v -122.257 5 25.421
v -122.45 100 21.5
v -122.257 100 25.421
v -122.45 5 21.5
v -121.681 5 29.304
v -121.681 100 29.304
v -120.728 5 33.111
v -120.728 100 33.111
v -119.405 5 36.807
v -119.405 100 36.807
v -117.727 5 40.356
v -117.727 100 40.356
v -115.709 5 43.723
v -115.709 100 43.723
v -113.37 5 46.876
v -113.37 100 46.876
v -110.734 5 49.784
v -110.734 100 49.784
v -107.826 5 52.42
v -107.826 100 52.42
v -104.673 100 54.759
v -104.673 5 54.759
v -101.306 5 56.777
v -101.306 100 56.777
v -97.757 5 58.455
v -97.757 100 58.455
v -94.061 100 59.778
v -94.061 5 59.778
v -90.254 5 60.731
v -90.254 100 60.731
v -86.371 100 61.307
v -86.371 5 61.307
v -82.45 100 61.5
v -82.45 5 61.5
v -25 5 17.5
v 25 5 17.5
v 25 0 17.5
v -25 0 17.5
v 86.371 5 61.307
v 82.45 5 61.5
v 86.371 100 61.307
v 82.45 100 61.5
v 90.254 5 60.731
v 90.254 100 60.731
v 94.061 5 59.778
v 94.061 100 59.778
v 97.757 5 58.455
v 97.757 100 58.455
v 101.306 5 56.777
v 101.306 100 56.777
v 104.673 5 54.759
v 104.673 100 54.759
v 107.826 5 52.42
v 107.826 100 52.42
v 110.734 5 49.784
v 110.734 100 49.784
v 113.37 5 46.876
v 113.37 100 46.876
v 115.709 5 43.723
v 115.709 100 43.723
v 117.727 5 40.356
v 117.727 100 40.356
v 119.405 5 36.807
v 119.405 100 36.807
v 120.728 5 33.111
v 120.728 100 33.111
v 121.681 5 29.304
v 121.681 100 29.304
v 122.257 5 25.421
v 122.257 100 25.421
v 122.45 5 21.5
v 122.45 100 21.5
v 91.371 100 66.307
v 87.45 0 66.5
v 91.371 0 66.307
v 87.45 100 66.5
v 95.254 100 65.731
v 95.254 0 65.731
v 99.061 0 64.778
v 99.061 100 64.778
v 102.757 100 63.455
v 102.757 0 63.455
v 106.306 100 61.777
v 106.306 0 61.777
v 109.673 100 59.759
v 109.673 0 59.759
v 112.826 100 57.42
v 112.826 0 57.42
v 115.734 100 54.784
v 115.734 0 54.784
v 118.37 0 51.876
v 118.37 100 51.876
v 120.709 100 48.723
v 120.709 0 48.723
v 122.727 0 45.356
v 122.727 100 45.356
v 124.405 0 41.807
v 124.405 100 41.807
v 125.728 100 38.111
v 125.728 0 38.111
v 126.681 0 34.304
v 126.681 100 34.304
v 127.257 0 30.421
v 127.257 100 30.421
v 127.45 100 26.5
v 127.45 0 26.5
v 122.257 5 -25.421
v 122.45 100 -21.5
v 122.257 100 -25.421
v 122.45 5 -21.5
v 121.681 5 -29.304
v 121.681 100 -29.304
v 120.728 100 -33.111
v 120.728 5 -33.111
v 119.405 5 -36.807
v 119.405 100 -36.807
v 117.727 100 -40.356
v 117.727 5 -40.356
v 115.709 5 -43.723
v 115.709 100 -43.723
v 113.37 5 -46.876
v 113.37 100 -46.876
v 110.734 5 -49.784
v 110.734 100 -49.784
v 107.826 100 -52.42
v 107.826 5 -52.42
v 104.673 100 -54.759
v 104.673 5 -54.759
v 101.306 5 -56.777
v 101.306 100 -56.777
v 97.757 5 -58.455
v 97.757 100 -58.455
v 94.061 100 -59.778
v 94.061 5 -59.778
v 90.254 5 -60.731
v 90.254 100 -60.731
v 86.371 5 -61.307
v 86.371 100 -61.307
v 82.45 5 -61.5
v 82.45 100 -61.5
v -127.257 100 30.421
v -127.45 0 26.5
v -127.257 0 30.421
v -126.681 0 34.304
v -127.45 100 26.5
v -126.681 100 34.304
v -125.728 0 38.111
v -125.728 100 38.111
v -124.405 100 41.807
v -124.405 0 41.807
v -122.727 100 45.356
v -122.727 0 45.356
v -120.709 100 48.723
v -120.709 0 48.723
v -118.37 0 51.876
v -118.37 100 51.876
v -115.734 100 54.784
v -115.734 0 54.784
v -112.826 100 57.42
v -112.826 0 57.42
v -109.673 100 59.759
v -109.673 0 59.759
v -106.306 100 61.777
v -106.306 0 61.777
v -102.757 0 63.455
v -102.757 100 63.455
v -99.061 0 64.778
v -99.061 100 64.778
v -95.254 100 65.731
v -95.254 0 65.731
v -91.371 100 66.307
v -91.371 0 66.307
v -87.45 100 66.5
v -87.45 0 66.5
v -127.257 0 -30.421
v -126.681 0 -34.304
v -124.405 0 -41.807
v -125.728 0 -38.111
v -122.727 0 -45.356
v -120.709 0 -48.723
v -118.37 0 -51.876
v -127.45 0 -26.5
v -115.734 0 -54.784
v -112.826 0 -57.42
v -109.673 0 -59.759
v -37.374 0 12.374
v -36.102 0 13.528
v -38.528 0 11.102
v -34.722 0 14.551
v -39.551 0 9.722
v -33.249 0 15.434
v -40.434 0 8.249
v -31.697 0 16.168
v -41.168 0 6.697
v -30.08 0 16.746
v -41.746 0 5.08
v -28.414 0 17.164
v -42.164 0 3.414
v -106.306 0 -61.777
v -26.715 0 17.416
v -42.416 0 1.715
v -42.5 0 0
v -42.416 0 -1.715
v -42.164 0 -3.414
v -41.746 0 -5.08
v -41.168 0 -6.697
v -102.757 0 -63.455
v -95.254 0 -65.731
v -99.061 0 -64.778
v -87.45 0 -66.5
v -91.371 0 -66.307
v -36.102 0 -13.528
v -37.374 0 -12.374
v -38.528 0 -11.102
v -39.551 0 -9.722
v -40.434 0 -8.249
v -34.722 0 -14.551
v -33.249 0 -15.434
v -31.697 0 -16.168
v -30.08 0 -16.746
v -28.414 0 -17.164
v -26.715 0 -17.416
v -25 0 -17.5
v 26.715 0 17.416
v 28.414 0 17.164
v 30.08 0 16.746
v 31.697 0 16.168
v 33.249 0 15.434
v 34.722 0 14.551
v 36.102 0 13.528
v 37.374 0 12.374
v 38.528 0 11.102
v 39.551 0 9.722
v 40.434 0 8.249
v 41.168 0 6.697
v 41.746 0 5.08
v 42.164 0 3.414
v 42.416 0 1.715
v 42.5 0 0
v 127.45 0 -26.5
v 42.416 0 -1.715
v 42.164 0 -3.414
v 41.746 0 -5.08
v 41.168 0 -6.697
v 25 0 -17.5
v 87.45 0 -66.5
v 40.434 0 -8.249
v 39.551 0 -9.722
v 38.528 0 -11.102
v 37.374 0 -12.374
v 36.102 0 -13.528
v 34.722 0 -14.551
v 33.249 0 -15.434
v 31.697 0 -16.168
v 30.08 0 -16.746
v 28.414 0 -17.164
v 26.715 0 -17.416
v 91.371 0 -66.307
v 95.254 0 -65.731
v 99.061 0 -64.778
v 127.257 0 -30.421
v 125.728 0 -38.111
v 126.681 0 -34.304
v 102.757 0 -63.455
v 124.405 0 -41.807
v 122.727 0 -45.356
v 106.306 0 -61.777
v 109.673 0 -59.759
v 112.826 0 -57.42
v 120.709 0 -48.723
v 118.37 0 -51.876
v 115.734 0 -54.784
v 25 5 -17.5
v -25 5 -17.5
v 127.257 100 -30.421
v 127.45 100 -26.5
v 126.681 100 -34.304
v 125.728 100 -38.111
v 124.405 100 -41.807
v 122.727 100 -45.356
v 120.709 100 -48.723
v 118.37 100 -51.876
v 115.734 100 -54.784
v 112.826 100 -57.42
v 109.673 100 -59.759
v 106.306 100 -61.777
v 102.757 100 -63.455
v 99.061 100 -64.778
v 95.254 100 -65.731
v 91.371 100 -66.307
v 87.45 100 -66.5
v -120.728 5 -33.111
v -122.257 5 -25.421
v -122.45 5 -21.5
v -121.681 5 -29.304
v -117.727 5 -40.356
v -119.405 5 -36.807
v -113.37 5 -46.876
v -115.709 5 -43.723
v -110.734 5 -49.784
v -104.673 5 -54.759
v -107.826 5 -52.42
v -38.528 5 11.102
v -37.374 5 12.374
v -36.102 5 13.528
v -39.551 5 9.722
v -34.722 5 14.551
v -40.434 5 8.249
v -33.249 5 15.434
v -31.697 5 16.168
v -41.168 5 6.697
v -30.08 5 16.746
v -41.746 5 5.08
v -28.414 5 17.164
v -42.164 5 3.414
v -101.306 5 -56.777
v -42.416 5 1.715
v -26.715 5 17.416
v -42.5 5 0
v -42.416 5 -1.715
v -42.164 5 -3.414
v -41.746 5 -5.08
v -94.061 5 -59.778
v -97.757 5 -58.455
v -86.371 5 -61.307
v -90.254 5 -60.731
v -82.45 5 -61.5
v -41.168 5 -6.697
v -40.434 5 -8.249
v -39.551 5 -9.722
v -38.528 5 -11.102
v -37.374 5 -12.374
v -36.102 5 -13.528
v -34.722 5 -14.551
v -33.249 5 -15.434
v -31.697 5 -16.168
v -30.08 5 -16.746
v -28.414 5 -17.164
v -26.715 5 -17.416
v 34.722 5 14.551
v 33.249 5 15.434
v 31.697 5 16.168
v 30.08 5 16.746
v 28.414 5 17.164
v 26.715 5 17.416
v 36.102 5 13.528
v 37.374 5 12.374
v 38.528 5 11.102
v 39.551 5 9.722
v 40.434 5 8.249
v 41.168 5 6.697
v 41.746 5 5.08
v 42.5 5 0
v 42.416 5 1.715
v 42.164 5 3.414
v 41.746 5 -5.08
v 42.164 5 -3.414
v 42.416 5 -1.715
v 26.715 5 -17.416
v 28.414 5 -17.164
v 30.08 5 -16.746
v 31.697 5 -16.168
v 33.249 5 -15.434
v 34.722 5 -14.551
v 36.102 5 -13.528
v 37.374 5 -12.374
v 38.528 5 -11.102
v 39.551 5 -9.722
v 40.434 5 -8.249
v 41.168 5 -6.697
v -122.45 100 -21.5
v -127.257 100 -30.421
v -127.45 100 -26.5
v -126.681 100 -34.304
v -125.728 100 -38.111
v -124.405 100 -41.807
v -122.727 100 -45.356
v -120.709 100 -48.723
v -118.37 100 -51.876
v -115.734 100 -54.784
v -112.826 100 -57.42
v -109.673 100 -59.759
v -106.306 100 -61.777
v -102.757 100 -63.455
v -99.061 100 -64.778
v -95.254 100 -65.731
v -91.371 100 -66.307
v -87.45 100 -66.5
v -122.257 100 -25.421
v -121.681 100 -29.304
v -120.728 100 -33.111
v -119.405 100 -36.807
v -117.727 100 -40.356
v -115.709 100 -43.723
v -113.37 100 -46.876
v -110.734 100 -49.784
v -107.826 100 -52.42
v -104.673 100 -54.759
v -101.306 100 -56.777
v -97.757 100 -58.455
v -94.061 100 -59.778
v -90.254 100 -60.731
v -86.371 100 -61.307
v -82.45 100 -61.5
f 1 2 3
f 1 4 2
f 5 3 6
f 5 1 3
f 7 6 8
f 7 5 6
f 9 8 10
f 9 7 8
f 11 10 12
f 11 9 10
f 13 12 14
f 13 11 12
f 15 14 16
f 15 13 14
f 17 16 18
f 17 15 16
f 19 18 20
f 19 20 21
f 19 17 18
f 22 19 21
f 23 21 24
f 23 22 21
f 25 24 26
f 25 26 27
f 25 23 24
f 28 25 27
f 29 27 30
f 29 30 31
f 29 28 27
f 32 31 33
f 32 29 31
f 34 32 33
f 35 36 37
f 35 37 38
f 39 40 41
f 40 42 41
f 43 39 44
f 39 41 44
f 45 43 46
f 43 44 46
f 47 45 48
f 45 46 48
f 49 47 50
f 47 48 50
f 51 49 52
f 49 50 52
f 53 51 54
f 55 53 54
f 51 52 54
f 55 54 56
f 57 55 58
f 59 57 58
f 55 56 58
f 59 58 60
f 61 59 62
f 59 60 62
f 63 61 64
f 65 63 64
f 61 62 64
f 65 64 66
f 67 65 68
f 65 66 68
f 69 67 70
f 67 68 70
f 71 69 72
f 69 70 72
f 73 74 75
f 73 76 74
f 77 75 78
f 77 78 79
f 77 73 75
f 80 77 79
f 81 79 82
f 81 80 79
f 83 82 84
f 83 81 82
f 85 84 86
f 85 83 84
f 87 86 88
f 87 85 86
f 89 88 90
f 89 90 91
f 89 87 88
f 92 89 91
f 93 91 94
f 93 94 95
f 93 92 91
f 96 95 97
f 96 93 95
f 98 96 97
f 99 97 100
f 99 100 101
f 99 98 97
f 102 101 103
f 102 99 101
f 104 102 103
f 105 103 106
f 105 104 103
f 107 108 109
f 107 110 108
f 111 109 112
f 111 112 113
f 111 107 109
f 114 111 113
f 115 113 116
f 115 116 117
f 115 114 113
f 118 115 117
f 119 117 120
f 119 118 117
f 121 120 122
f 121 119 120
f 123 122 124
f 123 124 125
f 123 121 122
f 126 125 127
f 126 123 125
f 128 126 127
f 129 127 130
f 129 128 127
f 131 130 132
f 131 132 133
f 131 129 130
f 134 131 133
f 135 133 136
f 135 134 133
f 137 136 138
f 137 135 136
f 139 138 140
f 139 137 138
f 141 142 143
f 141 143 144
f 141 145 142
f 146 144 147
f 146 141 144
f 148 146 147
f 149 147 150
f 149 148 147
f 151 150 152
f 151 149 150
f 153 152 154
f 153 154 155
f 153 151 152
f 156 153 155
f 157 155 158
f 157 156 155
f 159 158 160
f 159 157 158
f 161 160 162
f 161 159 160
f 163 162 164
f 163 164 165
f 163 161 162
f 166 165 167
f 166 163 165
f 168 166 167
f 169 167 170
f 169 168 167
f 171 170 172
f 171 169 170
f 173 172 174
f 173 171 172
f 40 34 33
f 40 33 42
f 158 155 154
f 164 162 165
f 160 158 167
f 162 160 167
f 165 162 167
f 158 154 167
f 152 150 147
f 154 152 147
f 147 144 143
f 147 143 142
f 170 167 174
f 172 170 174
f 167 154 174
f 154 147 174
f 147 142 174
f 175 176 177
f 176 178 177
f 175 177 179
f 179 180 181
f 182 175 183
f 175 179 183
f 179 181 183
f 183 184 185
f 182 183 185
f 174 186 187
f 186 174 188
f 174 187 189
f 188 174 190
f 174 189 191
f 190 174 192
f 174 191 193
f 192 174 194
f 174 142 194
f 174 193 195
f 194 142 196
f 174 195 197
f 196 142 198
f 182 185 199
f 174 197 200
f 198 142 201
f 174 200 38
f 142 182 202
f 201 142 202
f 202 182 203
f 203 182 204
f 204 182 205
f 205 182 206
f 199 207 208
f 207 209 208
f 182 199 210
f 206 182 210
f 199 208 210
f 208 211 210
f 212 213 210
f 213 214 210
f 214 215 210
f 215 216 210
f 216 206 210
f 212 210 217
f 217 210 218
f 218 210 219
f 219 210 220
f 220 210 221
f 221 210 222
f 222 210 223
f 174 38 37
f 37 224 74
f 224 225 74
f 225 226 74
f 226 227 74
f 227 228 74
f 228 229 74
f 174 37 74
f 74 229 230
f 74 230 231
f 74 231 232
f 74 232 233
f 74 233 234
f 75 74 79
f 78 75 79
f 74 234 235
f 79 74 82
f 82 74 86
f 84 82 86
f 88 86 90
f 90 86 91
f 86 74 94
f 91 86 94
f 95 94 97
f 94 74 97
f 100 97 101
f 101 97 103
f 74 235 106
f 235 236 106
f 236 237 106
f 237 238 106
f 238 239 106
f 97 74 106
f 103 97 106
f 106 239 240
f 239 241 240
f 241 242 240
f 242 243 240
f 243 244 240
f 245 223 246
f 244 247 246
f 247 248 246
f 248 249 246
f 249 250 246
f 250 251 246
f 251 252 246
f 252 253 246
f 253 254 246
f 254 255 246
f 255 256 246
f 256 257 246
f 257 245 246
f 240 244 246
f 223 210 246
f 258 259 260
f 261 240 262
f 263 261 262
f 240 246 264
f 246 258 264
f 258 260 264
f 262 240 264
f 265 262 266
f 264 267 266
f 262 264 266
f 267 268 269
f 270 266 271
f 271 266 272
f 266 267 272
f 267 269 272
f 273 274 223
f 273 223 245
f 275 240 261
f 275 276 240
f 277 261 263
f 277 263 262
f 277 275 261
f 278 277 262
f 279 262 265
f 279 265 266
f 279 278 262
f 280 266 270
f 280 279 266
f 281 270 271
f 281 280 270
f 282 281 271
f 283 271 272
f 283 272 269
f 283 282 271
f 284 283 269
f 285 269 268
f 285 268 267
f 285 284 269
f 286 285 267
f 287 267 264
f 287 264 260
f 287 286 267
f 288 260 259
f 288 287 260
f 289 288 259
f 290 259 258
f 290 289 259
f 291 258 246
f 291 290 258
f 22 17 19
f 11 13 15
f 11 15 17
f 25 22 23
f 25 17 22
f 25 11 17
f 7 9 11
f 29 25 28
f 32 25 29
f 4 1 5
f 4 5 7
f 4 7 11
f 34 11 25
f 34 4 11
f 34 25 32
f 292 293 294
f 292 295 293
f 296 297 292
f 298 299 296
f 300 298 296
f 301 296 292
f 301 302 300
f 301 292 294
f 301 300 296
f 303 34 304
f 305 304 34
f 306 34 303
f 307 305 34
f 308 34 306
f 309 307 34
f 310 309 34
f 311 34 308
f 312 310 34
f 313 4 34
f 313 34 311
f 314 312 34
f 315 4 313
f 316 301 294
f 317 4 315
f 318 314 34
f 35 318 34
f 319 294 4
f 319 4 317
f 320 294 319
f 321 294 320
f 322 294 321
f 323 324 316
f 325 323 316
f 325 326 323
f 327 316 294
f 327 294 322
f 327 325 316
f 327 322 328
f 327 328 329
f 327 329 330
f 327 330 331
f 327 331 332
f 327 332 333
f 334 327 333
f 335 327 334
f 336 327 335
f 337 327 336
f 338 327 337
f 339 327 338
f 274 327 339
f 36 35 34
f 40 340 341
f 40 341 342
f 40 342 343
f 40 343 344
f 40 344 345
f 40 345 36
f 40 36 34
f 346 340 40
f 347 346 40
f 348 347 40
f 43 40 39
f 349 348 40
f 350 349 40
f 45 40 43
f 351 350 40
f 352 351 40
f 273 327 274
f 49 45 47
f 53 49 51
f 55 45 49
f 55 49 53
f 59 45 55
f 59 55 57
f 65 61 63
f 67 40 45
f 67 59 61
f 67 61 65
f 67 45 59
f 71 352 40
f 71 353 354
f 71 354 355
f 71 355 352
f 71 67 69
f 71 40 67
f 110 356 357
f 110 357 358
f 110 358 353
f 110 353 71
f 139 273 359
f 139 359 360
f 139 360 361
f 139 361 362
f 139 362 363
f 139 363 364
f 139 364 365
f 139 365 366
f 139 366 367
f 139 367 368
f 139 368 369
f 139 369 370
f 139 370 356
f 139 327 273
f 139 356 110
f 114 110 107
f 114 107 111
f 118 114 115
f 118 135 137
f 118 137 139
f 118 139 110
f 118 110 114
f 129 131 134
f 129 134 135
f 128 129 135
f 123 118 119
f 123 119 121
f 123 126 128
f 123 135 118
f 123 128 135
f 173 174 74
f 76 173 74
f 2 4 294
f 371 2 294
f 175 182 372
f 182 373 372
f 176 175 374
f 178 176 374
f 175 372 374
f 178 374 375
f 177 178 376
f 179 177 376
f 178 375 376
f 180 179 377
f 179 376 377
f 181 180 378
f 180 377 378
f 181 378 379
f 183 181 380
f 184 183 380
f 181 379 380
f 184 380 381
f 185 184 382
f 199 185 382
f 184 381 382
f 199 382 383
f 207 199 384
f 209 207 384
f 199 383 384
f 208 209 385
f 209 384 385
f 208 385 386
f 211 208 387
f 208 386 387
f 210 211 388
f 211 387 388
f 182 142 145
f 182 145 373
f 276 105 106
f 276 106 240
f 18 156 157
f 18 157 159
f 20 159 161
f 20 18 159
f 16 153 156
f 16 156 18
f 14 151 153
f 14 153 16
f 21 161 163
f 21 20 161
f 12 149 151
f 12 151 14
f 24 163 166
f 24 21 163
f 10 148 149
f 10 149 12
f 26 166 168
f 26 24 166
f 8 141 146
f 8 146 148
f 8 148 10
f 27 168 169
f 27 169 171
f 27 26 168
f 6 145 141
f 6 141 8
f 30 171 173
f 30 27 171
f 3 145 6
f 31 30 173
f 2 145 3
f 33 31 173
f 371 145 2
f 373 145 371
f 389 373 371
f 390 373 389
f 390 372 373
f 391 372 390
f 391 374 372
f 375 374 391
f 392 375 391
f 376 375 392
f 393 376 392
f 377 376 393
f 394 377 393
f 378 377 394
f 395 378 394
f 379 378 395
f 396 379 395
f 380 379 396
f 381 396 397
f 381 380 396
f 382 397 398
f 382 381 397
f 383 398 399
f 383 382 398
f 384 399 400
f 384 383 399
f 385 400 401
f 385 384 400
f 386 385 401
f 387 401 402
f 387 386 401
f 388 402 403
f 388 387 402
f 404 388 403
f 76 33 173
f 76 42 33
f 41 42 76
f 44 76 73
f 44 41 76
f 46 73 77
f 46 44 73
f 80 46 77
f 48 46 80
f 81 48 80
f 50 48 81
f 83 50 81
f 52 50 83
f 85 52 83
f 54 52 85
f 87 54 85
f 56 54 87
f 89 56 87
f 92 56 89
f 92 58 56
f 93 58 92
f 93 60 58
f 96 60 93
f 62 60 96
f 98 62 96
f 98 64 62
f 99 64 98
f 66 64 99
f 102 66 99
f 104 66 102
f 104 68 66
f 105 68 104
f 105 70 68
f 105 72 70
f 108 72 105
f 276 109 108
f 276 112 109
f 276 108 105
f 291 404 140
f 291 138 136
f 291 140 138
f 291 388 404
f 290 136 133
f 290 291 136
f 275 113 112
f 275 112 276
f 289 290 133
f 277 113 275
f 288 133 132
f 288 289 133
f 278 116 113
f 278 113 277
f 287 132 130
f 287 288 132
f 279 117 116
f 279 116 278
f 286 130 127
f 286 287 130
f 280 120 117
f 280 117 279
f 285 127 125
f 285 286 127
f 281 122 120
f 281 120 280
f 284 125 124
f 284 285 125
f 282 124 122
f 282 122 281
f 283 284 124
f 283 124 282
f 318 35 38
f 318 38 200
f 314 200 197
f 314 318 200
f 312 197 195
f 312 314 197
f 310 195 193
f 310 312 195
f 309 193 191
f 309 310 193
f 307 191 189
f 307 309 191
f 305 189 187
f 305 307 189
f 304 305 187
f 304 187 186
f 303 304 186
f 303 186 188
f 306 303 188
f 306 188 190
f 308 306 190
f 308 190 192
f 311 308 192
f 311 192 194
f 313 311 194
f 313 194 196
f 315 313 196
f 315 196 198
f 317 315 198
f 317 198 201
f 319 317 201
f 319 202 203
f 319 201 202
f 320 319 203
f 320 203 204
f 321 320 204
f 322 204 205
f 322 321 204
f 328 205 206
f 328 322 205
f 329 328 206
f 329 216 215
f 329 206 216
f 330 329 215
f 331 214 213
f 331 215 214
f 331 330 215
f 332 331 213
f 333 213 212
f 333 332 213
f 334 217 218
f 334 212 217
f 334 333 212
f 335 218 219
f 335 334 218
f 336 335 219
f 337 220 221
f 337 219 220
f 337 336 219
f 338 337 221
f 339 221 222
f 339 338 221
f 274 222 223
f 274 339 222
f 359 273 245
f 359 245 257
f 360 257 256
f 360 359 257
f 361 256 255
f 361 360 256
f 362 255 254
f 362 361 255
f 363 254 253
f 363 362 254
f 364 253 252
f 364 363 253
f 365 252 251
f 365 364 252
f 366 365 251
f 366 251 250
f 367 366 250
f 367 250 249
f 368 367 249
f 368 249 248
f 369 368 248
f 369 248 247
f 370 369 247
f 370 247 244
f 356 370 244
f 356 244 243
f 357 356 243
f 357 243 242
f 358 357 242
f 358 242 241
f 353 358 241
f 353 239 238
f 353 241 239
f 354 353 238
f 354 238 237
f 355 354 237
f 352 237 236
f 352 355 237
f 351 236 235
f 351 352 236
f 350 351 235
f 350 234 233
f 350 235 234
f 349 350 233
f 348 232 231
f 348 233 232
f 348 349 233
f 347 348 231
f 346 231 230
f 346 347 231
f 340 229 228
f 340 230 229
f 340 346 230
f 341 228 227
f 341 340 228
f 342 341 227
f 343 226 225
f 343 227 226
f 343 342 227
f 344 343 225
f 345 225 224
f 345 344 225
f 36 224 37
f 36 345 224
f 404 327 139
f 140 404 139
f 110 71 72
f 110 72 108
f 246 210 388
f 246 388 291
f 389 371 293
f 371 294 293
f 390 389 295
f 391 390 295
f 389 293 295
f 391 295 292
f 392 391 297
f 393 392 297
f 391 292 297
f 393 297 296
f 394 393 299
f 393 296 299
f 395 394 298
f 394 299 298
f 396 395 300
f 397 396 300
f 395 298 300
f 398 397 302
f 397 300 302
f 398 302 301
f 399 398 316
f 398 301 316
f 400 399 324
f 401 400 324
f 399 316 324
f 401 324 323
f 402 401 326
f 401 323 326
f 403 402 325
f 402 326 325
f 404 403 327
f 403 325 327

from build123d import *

# Parameters (mm, degrees)
SKETCH_1_W          = 254.9
SKETCH_1_H          = 133
EXTRUDE_1_DEPTH     = 100
SHELL_1_T           = -5
FILLET_1_R          = 40
FILLET_2_R          = 40
CUT_EXTRUDE_1_DEPTH = 100


with BuildPart() as part:
    # 草图1 → 凸台-拉伸1 (new body)
    with BuildSketch(Plane(origin=(0, 0, 0), x_dir=(1, 0, 0), z_dir=(0, 1, 0))):
        Rectangle(SKETCH_1_W, SKETCH_1_H)
    extrude(amount=EXTRUDE_1_DEPTH)

    # 抽壳1
    shell_1_openings = [part.faces().sort_by_distance(p)[0] for p in [
        (0, 100, 0),
    ]]
    offset(amount=SHELL_1_T, openings=shell_1_openings, kind=Kind.INTERSECTION)

    # 圆角1
    fillet_1_edges = [part.edges().sort_by_distance(p)[0] for p in [
        (122.45, 52.5, 61.5),
        (122.45, 52.5, -61.5),
        (-122.45, 52.5, -61.5),
        (-122.45, 52.5, 61.5),
    ]]
    fillet(fillet_1_edges, radius=FILLET_1_R)

    # 圆角2
    fillet_2_edges = [part.edges().sort_by_distance(p)[0] for p in [
        (127.45, 50, 66.5),
        (-127.45, 50, 66.5),
        (-127.45, 50, -66.5),
        (127.45, 50, -66.5),
    ]]
    fillet(fillet_2_edges, radius=FILLET_2_R)

    # 草图2 → 切除-拉伸1 (cut)
    with BuildSketch(Plane(origin=(0, 5, 0), x_dir=(1, 0, 0), z_dir=(0, 1, 0))):
        with BuildLine():
            Line((-25, 17.5), (25, 17.5))
            ThreePointArc((25, 17.5), (42.5, 0), (25, -17.5))
            Line((25, -17.5), (-25, -17.5))
            ThreePointArc((-25, -17.5), (-42.5, 0), (-25, 17.5))
        make_face()
    extrude(amount=-CUT_EXTRUDE_1_DEPTH, mode=Mode.SUBTRACT)


solid = part.part
